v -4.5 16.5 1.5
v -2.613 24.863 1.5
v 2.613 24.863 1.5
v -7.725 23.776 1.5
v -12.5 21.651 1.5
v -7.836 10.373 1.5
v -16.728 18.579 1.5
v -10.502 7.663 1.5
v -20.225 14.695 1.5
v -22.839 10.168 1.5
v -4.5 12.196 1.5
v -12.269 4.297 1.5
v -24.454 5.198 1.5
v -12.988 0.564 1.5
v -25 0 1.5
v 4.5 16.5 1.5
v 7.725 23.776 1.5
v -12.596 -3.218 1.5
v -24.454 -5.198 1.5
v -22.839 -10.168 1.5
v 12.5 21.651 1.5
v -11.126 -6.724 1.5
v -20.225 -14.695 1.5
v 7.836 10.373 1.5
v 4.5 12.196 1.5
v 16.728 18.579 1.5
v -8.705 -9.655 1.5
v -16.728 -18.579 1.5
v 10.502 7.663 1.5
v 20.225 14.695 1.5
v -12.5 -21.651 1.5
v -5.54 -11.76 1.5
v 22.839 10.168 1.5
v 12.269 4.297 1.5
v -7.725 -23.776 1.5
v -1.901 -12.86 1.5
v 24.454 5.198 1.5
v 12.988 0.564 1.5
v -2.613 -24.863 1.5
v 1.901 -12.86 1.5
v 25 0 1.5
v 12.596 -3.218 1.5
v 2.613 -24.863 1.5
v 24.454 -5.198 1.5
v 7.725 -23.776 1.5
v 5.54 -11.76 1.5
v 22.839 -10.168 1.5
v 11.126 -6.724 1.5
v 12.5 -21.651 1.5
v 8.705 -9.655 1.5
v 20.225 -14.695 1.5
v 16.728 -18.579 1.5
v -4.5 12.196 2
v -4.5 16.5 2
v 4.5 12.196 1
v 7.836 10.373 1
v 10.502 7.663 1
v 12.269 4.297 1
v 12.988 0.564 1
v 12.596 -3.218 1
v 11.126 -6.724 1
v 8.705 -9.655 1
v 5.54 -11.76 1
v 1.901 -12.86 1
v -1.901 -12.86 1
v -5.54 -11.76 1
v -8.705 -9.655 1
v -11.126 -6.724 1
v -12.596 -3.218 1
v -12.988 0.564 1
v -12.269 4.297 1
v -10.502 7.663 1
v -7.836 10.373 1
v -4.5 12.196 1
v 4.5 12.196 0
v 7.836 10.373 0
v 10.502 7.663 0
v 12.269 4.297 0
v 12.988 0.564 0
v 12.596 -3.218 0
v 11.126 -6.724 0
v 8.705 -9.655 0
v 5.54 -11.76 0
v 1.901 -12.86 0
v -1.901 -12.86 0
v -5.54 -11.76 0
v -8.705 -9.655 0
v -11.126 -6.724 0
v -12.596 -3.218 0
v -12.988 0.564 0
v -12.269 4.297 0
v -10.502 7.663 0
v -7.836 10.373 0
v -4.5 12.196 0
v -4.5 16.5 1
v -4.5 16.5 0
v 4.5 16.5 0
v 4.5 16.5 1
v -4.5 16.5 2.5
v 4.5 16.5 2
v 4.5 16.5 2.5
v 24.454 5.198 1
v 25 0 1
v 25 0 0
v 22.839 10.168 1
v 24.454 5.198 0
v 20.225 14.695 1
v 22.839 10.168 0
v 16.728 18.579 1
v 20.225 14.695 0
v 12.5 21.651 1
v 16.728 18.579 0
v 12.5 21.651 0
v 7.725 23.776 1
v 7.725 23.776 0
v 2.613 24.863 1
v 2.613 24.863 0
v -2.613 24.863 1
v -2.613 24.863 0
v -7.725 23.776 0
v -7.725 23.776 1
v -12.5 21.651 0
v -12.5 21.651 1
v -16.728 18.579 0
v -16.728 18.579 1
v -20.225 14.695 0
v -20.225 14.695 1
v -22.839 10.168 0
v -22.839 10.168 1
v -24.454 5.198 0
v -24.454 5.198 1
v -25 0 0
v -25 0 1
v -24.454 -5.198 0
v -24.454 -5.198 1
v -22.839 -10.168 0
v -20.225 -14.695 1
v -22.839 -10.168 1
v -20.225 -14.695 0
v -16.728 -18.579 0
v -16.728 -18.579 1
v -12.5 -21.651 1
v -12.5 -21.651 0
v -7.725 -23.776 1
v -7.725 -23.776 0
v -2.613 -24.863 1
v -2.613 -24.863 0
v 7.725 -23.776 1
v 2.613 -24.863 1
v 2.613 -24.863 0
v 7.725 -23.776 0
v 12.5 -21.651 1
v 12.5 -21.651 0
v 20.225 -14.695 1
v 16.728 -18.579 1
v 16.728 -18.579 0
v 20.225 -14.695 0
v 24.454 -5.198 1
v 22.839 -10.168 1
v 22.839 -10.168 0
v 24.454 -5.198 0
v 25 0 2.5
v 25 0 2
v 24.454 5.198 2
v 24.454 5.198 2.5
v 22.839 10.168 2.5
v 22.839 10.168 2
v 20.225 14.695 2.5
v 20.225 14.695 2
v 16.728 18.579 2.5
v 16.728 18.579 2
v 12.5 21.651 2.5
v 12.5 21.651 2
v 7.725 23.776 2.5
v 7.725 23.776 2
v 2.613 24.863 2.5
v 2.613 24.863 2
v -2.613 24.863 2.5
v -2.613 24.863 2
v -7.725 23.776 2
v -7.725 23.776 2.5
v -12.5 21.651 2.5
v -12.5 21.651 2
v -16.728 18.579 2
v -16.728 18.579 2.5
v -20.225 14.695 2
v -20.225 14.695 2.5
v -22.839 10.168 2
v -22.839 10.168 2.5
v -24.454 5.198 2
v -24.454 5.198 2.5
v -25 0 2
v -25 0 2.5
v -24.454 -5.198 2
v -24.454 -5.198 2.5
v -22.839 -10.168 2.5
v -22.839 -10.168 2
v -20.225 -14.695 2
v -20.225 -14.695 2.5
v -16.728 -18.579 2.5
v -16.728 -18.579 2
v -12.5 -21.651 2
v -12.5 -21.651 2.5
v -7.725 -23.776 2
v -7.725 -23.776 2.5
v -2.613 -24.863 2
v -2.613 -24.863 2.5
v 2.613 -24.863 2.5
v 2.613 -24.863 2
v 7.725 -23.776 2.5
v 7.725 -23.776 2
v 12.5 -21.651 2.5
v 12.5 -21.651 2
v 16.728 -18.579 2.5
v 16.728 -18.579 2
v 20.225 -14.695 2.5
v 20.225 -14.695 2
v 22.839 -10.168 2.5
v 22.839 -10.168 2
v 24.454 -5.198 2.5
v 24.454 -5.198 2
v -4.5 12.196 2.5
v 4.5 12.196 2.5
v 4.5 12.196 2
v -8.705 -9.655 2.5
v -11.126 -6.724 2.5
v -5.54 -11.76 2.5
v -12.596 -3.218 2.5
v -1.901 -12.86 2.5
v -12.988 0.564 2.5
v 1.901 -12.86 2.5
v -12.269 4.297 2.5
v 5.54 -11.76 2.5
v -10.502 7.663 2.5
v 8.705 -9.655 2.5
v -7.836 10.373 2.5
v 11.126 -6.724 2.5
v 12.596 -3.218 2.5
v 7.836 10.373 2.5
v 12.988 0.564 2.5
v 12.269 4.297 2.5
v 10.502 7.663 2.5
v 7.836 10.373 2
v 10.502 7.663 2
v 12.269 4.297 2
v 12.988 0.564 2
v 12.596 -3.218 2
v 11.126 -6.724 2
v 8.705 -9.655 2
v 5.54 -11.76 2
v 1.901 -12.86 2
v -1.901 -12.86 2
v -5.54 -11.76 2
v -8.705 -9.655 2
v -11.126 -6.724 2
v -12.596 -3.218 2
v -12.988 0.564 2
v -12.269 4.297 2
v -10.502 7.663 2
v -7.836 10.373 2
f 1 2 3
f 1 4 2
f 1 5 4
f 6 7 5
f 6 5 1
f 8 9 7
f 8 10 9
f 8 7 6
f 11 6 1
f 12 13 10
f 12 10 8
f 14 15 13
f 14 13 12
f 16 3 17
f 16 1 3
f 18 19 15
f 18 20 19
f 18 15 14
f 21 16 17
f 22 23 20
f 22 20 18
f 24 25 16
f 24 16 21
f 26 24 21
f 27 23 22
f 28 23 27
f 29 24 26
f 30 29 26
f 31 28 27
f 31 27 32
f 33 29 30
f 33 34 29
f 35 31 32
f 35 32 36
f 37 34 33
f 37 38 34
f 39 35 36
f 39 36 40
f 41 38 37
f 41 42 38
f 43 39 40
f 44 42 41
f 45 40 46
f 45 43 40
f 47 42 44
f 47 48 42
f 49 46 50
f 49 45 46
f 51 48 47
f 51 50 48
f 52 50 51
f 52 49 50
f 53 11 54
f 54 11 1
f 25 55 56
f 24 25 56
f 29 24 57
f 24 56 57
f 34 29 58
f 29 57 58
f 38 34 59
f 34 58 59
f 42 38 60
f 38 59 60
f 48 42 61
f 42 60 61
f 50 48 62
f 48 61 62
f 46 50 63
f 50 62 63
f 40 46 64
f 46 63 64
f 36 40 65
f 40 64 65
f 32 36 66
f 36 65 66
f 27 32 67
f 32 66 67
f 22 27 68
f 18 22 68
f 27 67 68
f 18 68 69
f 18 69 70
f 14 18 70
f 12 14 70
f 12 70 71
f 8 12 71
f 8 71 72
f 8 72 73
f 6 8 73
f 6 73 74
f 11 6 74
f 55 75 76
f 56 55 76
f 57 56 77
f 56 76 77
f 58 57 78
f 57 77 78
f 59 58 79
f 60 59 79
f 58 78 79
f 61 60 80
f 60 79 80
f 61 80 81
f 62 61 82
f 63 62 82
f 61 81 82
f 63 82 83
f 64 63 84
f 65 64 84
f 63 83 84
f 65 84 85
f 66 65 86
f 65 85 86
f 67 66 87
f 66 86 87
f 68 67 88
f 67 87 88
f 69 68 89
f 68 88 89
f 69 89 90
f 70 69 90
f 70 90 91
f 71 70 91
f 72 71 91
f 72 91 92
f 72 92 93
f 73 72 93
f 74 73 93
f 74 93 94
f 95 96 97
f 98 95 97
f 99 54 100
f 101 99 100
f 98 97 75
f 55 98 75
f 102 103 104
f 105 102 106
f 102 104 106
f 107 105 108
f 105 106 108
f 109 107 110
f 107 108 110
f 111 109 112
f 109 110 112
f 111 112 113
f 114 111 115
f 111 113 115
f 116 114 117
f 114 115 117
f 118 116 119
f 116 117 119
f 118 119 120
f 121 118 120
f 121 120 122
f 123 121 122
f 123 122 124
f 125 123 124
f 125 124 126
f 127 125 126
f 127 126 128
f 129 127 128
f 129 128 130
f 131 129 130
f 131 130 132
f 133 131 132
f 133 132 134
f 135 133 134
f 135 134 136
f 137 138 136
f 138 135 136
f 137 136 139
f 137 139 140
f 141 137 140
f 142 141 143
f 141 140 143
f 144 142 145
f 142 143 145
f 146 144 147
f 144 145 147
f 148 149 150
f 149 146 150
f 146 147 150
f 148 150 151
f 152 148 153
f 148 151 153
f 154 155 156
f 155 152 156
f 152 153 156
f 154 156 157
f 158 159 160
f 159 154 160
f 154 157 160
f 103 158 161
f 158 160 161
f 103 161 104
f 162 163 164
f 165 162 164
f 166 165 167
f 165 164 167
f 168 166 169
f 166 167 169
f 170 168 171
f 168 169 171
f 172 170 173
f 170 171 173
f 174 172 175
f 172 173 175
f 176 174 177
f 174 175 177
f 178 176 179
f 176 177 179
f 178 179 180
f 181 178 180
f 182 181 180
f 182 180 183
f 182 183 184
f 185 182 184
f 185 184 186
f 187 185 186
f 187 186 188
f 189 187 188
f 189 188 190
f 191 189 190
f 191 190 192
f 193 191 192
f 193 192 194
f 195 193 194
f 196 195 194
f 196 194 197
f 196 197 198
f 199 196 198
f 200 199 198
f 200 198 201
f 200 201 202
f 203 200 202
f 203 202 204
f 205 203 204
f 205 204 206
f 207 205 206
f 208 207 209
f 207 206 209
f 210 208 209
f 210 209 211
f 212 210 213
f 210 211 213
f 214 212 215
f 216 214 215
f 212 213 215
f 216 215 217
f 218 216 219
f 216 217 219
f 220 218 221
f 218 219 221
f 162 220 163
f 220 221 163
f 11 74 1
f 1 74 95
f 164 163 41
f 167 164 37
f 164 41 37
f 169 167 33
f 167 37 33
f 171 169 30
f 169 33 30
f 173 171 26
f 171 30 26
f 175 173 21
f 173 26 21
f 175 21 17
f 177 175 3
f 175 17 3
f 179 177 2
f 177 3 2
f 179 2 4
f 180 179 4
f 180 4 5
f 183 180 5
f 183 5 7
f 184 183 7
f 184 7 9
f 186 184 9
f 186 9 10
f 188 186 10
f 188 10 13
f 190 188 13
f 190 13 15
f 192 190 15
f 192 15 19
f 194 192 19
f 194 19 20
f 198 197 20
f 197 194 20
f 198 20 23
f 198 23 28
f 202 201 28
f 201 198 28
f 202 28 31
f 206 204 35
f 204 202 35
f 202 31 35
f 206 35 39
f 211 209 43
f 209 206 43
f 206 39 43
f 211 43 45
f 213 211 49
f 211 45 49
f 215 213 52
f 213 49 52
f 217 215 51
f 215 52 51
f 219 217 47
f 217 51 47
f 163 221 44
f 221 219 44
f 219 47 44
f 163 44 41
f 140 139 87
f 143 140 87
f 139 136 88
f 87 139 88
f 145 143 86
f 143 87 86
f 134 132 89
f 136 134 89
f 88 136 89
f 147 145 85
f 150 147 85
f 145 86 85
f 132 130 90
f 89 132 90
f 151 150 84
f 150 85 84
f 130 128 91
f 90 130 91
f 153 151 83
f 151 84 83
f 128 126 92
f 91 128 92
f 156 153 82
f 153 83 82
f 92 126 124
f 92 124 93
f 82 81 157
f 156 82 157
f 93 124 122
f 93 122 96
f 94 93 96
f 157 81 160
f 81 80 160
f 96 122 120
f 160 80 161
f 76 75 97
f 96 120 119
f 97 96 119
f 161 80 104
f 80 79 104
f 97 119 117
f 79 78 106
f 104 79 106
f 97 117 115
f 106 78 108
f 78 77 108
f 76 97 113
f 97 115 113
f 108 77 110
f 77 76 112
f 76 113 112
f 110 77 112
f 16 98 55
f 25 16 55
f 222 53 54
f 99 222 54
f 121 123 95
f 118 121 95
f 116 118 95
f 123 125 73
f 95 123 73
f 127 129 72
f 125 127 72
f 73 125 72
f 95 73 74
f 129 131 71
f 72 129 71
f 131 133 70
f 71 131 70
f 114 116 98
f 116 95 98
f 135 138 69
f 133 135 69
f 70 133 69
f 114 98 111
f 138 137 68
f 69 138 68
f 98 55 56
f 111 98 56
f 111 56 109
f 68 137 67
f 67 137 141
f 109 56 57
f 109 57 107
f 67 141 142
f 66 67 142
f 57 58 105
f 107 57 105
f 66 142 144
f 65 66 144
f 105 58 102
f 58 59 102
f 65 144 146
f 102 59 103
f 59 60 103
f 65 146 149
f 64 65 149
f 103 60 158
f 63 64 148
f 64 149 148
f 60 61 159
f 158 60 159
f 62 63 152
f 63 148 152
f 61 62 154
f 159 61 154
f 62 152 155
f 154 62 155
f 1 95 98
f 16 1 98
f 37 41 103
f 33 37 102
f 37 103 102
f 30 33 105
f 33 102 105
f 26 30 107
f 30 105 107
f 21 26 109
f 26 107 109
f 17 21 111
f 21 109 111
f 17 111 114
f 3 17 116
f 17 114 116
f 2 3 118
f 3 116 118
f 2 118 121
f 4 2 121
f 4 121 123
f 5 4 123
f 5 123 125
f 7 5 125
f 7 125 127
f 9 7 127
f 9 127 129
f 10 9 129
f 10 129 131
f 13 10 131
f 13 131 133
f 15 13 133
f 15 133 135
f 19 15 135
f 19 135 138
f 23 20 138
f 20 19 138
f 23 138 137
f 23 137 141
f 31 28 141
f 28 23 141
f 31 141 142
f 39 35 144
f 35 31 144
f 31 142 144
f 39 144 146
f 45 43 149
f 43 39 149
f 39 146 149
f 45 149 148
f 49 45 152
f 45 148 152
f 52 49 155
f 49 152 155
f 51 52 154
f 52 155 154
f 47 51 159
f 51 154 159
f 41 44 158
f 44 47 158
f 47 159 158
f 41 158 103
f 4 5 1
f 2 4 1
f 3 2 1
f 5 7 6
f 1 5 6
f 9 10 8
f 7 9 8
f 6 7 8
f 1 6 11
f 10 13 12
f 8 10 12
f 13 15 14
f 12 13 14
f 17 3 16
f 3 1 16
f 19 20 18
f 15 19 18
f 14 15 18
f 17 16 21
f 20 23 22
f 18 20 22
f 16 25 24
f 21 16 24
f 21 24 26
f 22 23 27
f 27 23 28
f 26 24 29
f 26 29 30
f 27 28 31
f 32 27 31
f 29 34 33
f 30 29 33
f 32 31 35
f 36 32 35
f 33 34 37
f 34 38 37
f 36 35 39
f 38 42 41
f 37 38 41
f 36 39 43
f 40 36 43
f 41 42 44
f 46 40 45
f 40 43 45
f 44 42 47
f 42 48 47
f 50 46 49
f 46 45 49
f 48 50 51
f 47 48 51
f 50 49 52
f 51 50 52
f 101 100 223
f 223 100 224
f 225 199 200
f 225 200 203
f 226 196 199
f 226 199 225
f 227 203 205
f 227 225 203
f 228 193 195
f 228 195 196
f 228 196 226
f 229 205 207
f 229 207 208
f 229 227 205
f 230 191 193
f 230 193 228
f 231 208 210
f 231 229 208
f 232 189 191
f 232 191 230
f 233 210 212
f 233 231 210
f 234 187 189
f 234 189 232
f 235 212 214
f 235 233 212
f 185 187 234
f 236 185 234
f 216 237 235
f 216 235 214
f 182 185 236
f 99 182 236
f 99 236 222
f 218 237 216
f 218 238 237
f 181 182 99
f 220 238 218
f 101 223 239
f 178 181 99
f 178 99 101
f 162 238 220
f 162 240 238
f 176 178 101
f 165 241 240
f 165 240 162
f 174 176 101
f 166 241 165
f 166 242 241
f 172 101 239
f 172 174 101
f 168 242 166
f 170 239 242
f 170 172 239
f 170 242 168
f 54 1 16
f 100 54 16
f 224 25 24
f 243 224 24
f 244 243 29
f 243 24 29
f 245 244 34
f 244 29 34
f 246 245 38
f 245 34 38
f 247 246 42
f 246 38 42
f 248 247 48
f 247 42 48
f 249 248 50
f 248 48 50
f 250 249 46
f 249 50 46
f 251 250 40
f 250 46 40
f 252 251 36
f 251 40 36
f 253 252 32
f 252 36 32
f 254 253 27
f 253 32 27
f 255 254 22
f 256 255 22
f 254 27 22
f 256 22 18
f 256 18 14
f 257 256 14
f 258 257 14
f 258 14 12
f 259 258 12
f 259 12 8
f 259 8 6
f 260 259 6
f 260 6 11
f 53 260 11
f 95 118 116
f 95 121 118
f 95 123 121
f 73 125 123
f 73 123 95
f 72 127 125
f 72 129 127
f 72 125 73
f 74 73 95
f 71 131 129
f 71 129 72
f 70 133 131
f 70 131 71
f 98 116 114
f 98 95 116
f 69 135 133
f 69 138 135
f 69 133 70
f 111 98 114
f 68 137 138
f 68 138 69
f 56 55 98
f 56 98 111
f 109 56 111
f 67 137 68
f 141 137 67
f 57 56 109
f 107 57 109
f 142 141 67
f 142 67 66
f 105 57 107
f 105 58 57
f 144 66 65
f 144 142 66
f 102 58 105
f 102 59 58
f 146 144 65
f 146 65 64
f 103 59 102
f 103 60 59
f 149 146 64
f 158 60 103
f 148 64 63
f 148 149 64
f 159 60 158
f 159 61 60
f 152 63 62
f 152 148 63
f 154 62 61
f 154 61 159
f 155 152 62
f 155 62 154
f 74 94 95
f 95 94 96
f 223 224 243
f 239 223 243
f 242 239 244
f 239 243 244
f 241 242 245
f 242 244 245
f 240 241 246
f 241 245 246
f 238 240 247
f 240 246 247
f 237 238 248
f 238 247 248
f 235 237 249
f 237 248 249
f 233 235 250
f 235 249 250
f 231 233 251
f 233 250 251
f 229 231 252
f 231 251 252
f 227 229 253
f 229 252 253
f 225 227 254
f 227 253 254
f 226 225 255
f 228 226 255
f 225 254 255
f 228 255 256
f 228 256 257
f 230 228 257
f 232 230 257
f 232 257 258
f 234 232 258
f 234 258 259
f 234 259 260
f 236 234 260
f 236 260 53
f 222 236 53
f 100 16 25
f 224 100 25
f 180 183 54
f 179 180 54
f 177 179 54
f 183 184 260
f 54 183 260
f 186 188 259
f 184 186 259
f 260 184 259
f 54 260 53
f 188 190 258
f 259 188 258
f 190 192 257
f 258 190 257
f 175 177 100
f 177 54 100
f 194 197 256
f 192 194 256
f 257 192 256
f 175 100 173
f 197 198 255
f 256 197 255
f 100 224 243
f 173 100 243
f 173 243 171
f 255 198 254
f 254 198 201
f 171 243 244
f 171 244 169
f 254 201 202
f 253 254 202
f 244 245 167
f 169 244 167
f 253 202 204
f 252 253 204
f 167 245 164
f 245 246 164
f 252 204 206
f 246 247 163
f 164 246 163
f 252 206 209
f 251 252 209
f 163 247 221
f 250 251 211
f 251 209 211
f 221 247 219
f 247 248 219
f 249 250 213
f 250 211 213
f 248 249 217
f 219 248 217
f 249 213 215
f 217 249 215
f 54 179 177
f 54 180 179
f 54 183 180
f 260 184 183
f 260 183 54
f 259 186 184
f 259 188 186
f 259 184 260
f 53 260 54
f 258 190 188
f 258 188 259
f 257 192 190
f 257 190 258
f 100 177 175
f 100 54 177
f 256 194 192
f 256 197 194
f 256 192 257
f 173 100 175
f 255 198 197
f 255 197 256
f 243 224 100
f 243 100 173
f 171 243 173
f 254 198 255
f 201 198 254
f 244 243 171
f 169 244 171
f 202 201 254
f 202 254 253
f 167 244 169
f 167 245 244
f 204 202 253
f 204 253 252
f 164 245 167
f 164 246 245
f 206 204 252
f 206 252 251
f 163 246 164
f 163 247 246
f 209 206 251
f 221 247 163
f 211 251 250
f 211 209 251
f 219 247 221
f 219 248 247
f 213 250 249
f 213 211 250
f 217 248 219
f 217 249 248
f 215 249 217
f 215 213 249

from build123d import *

# Parameters (mm, degrees)
SKETCH_1_R                       = 25
EXTRUDE_1_DEPTH                  = 2.5
SPLIT_BODIES_1_SURFACE_3_1_BACK  = 71.755
SPLIT_BODIES_1_SURFACE_3_1_DEPTH = 143.51
SPLIT_BODIES_1_SURFACE_3_2_BACK  = 71.755
SPLIT_BODIES_1_SURFACE_3_2_DEPTH = 143.51
SPLIT_BODIES_1_SURFACE_4_3_BACK  = 71.755
SPLIT_BODIES_1_SURFACE_4_3_DEPTH = 143.51
SPLIT_BODIES_1_SURFACE_4_4_BACK  = 71.755
SPLIT_BODIES_1_SURFACE_4_4_DEPTH = 143.51
SPLIT_BODIES_1_SURFACE_5_5_BACK  = 71.755
SPLIT_BODIES_1_SURFACE_5_5_DEPTH = 143.51
SPLIT_BODIES_1_SURFACE_5_6_BACK  = 71.755
SPLIT_BODIES_1_SURFACE_5_6_DEPTH = 143.51


with BuildPart() as part:
    # Эскиз1 → Вытянуть1 (new body)
    with BuildSketch(Plane.XY):
        Circle(SKETCH_1_R)
        with BuildLine():
            Line((-4.5, 16.5), (4.5, 16.5))
            Line((4.5, 16.5), (4.5, 12.196310918))
            ThreePointArc((4.5, 12.196310918), (0, -13), (-4.5, 12.196310918))
            Line((-4.5, 12.196310918), (-4.5, 16.5))
        make_face(mode=Mode.SUBTRACT)
    extrude(amount=EXTRUDE_1_DEPTH)


with BuildPart() as body_2_3:
    # Split Bodies 1 3: the piece behind the surface
    add(part.part)
    # Split Bodies 1 surface 3: a surface, the sketch's curves swept straight by 143.51 mm
    with BuildLine(Plane(origin=(0, 0, 0), x_dir=(1, 0, 0), z_dir=(0, 1, 0)).offset(-SPLIT_BODIES_1_SURFACE_3_1_BACK), mode=Mode.PRIVATE) as split_bodies_1_surface_3_1_path:
        Line((-25, -1), (25, -1))
    split_bodies_1_surface_3_1 = Shell.extrude(split_bodies_1_surface_3_1_path.wire(), (0 * SPLIT_BODIES_1_SURFACE_3_1_DEPTH, 1 * SPLIT_BODIES_1_SURFACE_3_1_DEPTH, 0 * SPLIT_BODIES_1_SURFACE_3_1_DEPTH))
    split(bisect_by=split_bodies_1_surface_3_1, keep=Keep.BOTTOM)


with BuildPart() as part_1:
    add(part.part)

    # Split Bodies 1 3: split by a surface, the side it looks to stays
    # Split Bodies 1 surface 3: a surface, the sketch's curves swept straight by 143.51 mm
    with BuildLine(Plane(origin=(0, 0, 0), x_dir=(1, 0, 0), z_dir=(0, 1, 0)).offset(-SPLIT_BODIES_1_SURFACE_3_2_BACK), mode=Mode.PRIVATE) as split_bodies_1_surface_3_2_path:
        Line((-25, -1), (25, -1))
    split_bodies_1_surface_3_2 = Shell.extrude(split_bodies_1_surface_3_2_path.wire(), (0 * SPLIT_BODIES_1_SURFACE_3_2_DEPTH, 1 * SPLIT_BODIES_1_SURFACE_3_2_DEPTH, 0 * SPLIT_BODIES_1_SURFACE_3_2_DEPTH))
    split(bisect_by=split_bodies_1_surface_3_2, keep=Keep.TOP)


with BuildPart() as body_3:
    # Split Bodies 1 4 body 2 3: the piece behind the surface
    add(body_2_3.part)
    # Split Bodies 1 surface 4: a surface, the sketch's curves swept straight by 143.51 mm
    with BuildLine(Plane(origin=(0, 0, 0), x_dir=(1, 0, 0), z_dir=(0, 1, 0)).offset(-SPLIT_BODIES_1_SURFACE_4_3_BACK), mode=Mode.PRIVATE) as split_bodies_1_surface_4_3_path:
        Line((-25, -1.5), (25, -1.5))
    split_bodies_1_surface_4_3 = Shell.extrude(split_bodies_1_surface_4_3_path.wire(), (0 * SPLIT_BODIES_1_SURFACE_4_3_DEPTH, 1 * SPLIT_BODIES_1_SURFACE_4_3_DEPTH, 0 * SPLIT_BODIES_1_SURFACE_4_3_DEPTH))
    split(bisect_by=split_bodies_1_surface_4_3, keep=Keep.BOTTOM)


with BuildPart() as body_2_3_1:
    add(body_2_3.part)

    # Split Bodies 1 4 body 2 3: split by a surface, the side it looks to stays
    # Split Bodies 1 surface 4: a surface, the sketch's curves swept straight by 143.51 mm
    with BuildLine(Plane(origin=(0, 0, 0), x_dir=(1, 0, 0), z_dir=(0, 1, 0)).offset(-SPLIT_BODIES_1_SURFACE_4_4_BACK), mode=Mode.PRIVATE) as split_bodies_1_surface_4_4_path:
        Line((-25, -1.5), (25, -1.5))
    split_bodies_1_surface_4_4 = Shell.extrude(split_bodies_1_surface_4_4_path.wire(), (0 * SPLIT_BODIES_1_SURFACE_4_4_DEPTH, 1 * SPLIT_BODIES_1_SURFACE_4_4_DEPTH, 0 * SPLIT_BODIES_1_SURFACE_4_4_DEPTH))
    split(bisect_by=split_bodies_1_surface_4_4, keep=Keep.TOP)


with BuildPart() as body_4:
    # Split Bodies 1 5 body 3: the piece behind the surface
    add(body_3.part)
    # Split Bodies 1 surface 5: a surface, the sketch's curves swept straight by 143.51 mm
    with BuildLine(Plane(origin=(0, 0, 0), x_dir=(1, 0, 0), z_dir=(0, 1, 0)).offset(-SPLIT_BODIES_1_SURFACE_5_5_BACK), mode=Mode.PRIVATE) as split_bodies_1_surface_5_5_path:
        Line((-25, -2), (25, -2))
    split_bodies_1_surface_5_5 = Shell.extrude(split_bodies_1_surface_5_5_path.wire(), (0 * SPLIT_BODIES_1_SURFACE_5_5_DEPTH, 1 * SPLIT_BODIES_1_SURFACE_5_5_DEPTH, 0 * SPLIT_BODIES_1_SURFACE_5_5_DEPTH))
    split(bisect_by=split_bodies_1_surface_5_5, keep=Keep.BOTTOM)


with BuildPart() as body_3_1:
    add(body_3.part)

    # Split Bodies 1 5 body 3: split by a surface, the side it looks to stays
    # Split Bodies 1 surface 5: a surface, the sketch's curves swept straight by 143.51 mm
    with BuildLine(Plane(origin=(0, 0, 0), x_dir=(1, 0, 0), z_dir=(0, 1, 0)).offset(-SPLIT_BODIES_1_SURFACE_5_6_BACK), mode=Mode.PRIVATE) as split_bodies_1_surface_5_6_path:
        Line((-25, -2), (25, -2))
    split_bodies_1_surface_5_6 = Shell.extrude(split_bodies_1_surface_5_6_path.wire(), (0 * SPLIT_BODIES_1_SURFACE_5_6_DEPTH, 1 * SPLIT_BODIES_1_SURFACE_5_6_DEPTH, 0 * SPLIT_BODIES_1_SURFACE_5_6_DEPTH))
    split(bisect_by=split_bodies_1_surface_5_6, keep=Keep.TOP)


solid = Compound([part_1.part, body_2_3_1.part, body_4.part, body_3_1.part])
